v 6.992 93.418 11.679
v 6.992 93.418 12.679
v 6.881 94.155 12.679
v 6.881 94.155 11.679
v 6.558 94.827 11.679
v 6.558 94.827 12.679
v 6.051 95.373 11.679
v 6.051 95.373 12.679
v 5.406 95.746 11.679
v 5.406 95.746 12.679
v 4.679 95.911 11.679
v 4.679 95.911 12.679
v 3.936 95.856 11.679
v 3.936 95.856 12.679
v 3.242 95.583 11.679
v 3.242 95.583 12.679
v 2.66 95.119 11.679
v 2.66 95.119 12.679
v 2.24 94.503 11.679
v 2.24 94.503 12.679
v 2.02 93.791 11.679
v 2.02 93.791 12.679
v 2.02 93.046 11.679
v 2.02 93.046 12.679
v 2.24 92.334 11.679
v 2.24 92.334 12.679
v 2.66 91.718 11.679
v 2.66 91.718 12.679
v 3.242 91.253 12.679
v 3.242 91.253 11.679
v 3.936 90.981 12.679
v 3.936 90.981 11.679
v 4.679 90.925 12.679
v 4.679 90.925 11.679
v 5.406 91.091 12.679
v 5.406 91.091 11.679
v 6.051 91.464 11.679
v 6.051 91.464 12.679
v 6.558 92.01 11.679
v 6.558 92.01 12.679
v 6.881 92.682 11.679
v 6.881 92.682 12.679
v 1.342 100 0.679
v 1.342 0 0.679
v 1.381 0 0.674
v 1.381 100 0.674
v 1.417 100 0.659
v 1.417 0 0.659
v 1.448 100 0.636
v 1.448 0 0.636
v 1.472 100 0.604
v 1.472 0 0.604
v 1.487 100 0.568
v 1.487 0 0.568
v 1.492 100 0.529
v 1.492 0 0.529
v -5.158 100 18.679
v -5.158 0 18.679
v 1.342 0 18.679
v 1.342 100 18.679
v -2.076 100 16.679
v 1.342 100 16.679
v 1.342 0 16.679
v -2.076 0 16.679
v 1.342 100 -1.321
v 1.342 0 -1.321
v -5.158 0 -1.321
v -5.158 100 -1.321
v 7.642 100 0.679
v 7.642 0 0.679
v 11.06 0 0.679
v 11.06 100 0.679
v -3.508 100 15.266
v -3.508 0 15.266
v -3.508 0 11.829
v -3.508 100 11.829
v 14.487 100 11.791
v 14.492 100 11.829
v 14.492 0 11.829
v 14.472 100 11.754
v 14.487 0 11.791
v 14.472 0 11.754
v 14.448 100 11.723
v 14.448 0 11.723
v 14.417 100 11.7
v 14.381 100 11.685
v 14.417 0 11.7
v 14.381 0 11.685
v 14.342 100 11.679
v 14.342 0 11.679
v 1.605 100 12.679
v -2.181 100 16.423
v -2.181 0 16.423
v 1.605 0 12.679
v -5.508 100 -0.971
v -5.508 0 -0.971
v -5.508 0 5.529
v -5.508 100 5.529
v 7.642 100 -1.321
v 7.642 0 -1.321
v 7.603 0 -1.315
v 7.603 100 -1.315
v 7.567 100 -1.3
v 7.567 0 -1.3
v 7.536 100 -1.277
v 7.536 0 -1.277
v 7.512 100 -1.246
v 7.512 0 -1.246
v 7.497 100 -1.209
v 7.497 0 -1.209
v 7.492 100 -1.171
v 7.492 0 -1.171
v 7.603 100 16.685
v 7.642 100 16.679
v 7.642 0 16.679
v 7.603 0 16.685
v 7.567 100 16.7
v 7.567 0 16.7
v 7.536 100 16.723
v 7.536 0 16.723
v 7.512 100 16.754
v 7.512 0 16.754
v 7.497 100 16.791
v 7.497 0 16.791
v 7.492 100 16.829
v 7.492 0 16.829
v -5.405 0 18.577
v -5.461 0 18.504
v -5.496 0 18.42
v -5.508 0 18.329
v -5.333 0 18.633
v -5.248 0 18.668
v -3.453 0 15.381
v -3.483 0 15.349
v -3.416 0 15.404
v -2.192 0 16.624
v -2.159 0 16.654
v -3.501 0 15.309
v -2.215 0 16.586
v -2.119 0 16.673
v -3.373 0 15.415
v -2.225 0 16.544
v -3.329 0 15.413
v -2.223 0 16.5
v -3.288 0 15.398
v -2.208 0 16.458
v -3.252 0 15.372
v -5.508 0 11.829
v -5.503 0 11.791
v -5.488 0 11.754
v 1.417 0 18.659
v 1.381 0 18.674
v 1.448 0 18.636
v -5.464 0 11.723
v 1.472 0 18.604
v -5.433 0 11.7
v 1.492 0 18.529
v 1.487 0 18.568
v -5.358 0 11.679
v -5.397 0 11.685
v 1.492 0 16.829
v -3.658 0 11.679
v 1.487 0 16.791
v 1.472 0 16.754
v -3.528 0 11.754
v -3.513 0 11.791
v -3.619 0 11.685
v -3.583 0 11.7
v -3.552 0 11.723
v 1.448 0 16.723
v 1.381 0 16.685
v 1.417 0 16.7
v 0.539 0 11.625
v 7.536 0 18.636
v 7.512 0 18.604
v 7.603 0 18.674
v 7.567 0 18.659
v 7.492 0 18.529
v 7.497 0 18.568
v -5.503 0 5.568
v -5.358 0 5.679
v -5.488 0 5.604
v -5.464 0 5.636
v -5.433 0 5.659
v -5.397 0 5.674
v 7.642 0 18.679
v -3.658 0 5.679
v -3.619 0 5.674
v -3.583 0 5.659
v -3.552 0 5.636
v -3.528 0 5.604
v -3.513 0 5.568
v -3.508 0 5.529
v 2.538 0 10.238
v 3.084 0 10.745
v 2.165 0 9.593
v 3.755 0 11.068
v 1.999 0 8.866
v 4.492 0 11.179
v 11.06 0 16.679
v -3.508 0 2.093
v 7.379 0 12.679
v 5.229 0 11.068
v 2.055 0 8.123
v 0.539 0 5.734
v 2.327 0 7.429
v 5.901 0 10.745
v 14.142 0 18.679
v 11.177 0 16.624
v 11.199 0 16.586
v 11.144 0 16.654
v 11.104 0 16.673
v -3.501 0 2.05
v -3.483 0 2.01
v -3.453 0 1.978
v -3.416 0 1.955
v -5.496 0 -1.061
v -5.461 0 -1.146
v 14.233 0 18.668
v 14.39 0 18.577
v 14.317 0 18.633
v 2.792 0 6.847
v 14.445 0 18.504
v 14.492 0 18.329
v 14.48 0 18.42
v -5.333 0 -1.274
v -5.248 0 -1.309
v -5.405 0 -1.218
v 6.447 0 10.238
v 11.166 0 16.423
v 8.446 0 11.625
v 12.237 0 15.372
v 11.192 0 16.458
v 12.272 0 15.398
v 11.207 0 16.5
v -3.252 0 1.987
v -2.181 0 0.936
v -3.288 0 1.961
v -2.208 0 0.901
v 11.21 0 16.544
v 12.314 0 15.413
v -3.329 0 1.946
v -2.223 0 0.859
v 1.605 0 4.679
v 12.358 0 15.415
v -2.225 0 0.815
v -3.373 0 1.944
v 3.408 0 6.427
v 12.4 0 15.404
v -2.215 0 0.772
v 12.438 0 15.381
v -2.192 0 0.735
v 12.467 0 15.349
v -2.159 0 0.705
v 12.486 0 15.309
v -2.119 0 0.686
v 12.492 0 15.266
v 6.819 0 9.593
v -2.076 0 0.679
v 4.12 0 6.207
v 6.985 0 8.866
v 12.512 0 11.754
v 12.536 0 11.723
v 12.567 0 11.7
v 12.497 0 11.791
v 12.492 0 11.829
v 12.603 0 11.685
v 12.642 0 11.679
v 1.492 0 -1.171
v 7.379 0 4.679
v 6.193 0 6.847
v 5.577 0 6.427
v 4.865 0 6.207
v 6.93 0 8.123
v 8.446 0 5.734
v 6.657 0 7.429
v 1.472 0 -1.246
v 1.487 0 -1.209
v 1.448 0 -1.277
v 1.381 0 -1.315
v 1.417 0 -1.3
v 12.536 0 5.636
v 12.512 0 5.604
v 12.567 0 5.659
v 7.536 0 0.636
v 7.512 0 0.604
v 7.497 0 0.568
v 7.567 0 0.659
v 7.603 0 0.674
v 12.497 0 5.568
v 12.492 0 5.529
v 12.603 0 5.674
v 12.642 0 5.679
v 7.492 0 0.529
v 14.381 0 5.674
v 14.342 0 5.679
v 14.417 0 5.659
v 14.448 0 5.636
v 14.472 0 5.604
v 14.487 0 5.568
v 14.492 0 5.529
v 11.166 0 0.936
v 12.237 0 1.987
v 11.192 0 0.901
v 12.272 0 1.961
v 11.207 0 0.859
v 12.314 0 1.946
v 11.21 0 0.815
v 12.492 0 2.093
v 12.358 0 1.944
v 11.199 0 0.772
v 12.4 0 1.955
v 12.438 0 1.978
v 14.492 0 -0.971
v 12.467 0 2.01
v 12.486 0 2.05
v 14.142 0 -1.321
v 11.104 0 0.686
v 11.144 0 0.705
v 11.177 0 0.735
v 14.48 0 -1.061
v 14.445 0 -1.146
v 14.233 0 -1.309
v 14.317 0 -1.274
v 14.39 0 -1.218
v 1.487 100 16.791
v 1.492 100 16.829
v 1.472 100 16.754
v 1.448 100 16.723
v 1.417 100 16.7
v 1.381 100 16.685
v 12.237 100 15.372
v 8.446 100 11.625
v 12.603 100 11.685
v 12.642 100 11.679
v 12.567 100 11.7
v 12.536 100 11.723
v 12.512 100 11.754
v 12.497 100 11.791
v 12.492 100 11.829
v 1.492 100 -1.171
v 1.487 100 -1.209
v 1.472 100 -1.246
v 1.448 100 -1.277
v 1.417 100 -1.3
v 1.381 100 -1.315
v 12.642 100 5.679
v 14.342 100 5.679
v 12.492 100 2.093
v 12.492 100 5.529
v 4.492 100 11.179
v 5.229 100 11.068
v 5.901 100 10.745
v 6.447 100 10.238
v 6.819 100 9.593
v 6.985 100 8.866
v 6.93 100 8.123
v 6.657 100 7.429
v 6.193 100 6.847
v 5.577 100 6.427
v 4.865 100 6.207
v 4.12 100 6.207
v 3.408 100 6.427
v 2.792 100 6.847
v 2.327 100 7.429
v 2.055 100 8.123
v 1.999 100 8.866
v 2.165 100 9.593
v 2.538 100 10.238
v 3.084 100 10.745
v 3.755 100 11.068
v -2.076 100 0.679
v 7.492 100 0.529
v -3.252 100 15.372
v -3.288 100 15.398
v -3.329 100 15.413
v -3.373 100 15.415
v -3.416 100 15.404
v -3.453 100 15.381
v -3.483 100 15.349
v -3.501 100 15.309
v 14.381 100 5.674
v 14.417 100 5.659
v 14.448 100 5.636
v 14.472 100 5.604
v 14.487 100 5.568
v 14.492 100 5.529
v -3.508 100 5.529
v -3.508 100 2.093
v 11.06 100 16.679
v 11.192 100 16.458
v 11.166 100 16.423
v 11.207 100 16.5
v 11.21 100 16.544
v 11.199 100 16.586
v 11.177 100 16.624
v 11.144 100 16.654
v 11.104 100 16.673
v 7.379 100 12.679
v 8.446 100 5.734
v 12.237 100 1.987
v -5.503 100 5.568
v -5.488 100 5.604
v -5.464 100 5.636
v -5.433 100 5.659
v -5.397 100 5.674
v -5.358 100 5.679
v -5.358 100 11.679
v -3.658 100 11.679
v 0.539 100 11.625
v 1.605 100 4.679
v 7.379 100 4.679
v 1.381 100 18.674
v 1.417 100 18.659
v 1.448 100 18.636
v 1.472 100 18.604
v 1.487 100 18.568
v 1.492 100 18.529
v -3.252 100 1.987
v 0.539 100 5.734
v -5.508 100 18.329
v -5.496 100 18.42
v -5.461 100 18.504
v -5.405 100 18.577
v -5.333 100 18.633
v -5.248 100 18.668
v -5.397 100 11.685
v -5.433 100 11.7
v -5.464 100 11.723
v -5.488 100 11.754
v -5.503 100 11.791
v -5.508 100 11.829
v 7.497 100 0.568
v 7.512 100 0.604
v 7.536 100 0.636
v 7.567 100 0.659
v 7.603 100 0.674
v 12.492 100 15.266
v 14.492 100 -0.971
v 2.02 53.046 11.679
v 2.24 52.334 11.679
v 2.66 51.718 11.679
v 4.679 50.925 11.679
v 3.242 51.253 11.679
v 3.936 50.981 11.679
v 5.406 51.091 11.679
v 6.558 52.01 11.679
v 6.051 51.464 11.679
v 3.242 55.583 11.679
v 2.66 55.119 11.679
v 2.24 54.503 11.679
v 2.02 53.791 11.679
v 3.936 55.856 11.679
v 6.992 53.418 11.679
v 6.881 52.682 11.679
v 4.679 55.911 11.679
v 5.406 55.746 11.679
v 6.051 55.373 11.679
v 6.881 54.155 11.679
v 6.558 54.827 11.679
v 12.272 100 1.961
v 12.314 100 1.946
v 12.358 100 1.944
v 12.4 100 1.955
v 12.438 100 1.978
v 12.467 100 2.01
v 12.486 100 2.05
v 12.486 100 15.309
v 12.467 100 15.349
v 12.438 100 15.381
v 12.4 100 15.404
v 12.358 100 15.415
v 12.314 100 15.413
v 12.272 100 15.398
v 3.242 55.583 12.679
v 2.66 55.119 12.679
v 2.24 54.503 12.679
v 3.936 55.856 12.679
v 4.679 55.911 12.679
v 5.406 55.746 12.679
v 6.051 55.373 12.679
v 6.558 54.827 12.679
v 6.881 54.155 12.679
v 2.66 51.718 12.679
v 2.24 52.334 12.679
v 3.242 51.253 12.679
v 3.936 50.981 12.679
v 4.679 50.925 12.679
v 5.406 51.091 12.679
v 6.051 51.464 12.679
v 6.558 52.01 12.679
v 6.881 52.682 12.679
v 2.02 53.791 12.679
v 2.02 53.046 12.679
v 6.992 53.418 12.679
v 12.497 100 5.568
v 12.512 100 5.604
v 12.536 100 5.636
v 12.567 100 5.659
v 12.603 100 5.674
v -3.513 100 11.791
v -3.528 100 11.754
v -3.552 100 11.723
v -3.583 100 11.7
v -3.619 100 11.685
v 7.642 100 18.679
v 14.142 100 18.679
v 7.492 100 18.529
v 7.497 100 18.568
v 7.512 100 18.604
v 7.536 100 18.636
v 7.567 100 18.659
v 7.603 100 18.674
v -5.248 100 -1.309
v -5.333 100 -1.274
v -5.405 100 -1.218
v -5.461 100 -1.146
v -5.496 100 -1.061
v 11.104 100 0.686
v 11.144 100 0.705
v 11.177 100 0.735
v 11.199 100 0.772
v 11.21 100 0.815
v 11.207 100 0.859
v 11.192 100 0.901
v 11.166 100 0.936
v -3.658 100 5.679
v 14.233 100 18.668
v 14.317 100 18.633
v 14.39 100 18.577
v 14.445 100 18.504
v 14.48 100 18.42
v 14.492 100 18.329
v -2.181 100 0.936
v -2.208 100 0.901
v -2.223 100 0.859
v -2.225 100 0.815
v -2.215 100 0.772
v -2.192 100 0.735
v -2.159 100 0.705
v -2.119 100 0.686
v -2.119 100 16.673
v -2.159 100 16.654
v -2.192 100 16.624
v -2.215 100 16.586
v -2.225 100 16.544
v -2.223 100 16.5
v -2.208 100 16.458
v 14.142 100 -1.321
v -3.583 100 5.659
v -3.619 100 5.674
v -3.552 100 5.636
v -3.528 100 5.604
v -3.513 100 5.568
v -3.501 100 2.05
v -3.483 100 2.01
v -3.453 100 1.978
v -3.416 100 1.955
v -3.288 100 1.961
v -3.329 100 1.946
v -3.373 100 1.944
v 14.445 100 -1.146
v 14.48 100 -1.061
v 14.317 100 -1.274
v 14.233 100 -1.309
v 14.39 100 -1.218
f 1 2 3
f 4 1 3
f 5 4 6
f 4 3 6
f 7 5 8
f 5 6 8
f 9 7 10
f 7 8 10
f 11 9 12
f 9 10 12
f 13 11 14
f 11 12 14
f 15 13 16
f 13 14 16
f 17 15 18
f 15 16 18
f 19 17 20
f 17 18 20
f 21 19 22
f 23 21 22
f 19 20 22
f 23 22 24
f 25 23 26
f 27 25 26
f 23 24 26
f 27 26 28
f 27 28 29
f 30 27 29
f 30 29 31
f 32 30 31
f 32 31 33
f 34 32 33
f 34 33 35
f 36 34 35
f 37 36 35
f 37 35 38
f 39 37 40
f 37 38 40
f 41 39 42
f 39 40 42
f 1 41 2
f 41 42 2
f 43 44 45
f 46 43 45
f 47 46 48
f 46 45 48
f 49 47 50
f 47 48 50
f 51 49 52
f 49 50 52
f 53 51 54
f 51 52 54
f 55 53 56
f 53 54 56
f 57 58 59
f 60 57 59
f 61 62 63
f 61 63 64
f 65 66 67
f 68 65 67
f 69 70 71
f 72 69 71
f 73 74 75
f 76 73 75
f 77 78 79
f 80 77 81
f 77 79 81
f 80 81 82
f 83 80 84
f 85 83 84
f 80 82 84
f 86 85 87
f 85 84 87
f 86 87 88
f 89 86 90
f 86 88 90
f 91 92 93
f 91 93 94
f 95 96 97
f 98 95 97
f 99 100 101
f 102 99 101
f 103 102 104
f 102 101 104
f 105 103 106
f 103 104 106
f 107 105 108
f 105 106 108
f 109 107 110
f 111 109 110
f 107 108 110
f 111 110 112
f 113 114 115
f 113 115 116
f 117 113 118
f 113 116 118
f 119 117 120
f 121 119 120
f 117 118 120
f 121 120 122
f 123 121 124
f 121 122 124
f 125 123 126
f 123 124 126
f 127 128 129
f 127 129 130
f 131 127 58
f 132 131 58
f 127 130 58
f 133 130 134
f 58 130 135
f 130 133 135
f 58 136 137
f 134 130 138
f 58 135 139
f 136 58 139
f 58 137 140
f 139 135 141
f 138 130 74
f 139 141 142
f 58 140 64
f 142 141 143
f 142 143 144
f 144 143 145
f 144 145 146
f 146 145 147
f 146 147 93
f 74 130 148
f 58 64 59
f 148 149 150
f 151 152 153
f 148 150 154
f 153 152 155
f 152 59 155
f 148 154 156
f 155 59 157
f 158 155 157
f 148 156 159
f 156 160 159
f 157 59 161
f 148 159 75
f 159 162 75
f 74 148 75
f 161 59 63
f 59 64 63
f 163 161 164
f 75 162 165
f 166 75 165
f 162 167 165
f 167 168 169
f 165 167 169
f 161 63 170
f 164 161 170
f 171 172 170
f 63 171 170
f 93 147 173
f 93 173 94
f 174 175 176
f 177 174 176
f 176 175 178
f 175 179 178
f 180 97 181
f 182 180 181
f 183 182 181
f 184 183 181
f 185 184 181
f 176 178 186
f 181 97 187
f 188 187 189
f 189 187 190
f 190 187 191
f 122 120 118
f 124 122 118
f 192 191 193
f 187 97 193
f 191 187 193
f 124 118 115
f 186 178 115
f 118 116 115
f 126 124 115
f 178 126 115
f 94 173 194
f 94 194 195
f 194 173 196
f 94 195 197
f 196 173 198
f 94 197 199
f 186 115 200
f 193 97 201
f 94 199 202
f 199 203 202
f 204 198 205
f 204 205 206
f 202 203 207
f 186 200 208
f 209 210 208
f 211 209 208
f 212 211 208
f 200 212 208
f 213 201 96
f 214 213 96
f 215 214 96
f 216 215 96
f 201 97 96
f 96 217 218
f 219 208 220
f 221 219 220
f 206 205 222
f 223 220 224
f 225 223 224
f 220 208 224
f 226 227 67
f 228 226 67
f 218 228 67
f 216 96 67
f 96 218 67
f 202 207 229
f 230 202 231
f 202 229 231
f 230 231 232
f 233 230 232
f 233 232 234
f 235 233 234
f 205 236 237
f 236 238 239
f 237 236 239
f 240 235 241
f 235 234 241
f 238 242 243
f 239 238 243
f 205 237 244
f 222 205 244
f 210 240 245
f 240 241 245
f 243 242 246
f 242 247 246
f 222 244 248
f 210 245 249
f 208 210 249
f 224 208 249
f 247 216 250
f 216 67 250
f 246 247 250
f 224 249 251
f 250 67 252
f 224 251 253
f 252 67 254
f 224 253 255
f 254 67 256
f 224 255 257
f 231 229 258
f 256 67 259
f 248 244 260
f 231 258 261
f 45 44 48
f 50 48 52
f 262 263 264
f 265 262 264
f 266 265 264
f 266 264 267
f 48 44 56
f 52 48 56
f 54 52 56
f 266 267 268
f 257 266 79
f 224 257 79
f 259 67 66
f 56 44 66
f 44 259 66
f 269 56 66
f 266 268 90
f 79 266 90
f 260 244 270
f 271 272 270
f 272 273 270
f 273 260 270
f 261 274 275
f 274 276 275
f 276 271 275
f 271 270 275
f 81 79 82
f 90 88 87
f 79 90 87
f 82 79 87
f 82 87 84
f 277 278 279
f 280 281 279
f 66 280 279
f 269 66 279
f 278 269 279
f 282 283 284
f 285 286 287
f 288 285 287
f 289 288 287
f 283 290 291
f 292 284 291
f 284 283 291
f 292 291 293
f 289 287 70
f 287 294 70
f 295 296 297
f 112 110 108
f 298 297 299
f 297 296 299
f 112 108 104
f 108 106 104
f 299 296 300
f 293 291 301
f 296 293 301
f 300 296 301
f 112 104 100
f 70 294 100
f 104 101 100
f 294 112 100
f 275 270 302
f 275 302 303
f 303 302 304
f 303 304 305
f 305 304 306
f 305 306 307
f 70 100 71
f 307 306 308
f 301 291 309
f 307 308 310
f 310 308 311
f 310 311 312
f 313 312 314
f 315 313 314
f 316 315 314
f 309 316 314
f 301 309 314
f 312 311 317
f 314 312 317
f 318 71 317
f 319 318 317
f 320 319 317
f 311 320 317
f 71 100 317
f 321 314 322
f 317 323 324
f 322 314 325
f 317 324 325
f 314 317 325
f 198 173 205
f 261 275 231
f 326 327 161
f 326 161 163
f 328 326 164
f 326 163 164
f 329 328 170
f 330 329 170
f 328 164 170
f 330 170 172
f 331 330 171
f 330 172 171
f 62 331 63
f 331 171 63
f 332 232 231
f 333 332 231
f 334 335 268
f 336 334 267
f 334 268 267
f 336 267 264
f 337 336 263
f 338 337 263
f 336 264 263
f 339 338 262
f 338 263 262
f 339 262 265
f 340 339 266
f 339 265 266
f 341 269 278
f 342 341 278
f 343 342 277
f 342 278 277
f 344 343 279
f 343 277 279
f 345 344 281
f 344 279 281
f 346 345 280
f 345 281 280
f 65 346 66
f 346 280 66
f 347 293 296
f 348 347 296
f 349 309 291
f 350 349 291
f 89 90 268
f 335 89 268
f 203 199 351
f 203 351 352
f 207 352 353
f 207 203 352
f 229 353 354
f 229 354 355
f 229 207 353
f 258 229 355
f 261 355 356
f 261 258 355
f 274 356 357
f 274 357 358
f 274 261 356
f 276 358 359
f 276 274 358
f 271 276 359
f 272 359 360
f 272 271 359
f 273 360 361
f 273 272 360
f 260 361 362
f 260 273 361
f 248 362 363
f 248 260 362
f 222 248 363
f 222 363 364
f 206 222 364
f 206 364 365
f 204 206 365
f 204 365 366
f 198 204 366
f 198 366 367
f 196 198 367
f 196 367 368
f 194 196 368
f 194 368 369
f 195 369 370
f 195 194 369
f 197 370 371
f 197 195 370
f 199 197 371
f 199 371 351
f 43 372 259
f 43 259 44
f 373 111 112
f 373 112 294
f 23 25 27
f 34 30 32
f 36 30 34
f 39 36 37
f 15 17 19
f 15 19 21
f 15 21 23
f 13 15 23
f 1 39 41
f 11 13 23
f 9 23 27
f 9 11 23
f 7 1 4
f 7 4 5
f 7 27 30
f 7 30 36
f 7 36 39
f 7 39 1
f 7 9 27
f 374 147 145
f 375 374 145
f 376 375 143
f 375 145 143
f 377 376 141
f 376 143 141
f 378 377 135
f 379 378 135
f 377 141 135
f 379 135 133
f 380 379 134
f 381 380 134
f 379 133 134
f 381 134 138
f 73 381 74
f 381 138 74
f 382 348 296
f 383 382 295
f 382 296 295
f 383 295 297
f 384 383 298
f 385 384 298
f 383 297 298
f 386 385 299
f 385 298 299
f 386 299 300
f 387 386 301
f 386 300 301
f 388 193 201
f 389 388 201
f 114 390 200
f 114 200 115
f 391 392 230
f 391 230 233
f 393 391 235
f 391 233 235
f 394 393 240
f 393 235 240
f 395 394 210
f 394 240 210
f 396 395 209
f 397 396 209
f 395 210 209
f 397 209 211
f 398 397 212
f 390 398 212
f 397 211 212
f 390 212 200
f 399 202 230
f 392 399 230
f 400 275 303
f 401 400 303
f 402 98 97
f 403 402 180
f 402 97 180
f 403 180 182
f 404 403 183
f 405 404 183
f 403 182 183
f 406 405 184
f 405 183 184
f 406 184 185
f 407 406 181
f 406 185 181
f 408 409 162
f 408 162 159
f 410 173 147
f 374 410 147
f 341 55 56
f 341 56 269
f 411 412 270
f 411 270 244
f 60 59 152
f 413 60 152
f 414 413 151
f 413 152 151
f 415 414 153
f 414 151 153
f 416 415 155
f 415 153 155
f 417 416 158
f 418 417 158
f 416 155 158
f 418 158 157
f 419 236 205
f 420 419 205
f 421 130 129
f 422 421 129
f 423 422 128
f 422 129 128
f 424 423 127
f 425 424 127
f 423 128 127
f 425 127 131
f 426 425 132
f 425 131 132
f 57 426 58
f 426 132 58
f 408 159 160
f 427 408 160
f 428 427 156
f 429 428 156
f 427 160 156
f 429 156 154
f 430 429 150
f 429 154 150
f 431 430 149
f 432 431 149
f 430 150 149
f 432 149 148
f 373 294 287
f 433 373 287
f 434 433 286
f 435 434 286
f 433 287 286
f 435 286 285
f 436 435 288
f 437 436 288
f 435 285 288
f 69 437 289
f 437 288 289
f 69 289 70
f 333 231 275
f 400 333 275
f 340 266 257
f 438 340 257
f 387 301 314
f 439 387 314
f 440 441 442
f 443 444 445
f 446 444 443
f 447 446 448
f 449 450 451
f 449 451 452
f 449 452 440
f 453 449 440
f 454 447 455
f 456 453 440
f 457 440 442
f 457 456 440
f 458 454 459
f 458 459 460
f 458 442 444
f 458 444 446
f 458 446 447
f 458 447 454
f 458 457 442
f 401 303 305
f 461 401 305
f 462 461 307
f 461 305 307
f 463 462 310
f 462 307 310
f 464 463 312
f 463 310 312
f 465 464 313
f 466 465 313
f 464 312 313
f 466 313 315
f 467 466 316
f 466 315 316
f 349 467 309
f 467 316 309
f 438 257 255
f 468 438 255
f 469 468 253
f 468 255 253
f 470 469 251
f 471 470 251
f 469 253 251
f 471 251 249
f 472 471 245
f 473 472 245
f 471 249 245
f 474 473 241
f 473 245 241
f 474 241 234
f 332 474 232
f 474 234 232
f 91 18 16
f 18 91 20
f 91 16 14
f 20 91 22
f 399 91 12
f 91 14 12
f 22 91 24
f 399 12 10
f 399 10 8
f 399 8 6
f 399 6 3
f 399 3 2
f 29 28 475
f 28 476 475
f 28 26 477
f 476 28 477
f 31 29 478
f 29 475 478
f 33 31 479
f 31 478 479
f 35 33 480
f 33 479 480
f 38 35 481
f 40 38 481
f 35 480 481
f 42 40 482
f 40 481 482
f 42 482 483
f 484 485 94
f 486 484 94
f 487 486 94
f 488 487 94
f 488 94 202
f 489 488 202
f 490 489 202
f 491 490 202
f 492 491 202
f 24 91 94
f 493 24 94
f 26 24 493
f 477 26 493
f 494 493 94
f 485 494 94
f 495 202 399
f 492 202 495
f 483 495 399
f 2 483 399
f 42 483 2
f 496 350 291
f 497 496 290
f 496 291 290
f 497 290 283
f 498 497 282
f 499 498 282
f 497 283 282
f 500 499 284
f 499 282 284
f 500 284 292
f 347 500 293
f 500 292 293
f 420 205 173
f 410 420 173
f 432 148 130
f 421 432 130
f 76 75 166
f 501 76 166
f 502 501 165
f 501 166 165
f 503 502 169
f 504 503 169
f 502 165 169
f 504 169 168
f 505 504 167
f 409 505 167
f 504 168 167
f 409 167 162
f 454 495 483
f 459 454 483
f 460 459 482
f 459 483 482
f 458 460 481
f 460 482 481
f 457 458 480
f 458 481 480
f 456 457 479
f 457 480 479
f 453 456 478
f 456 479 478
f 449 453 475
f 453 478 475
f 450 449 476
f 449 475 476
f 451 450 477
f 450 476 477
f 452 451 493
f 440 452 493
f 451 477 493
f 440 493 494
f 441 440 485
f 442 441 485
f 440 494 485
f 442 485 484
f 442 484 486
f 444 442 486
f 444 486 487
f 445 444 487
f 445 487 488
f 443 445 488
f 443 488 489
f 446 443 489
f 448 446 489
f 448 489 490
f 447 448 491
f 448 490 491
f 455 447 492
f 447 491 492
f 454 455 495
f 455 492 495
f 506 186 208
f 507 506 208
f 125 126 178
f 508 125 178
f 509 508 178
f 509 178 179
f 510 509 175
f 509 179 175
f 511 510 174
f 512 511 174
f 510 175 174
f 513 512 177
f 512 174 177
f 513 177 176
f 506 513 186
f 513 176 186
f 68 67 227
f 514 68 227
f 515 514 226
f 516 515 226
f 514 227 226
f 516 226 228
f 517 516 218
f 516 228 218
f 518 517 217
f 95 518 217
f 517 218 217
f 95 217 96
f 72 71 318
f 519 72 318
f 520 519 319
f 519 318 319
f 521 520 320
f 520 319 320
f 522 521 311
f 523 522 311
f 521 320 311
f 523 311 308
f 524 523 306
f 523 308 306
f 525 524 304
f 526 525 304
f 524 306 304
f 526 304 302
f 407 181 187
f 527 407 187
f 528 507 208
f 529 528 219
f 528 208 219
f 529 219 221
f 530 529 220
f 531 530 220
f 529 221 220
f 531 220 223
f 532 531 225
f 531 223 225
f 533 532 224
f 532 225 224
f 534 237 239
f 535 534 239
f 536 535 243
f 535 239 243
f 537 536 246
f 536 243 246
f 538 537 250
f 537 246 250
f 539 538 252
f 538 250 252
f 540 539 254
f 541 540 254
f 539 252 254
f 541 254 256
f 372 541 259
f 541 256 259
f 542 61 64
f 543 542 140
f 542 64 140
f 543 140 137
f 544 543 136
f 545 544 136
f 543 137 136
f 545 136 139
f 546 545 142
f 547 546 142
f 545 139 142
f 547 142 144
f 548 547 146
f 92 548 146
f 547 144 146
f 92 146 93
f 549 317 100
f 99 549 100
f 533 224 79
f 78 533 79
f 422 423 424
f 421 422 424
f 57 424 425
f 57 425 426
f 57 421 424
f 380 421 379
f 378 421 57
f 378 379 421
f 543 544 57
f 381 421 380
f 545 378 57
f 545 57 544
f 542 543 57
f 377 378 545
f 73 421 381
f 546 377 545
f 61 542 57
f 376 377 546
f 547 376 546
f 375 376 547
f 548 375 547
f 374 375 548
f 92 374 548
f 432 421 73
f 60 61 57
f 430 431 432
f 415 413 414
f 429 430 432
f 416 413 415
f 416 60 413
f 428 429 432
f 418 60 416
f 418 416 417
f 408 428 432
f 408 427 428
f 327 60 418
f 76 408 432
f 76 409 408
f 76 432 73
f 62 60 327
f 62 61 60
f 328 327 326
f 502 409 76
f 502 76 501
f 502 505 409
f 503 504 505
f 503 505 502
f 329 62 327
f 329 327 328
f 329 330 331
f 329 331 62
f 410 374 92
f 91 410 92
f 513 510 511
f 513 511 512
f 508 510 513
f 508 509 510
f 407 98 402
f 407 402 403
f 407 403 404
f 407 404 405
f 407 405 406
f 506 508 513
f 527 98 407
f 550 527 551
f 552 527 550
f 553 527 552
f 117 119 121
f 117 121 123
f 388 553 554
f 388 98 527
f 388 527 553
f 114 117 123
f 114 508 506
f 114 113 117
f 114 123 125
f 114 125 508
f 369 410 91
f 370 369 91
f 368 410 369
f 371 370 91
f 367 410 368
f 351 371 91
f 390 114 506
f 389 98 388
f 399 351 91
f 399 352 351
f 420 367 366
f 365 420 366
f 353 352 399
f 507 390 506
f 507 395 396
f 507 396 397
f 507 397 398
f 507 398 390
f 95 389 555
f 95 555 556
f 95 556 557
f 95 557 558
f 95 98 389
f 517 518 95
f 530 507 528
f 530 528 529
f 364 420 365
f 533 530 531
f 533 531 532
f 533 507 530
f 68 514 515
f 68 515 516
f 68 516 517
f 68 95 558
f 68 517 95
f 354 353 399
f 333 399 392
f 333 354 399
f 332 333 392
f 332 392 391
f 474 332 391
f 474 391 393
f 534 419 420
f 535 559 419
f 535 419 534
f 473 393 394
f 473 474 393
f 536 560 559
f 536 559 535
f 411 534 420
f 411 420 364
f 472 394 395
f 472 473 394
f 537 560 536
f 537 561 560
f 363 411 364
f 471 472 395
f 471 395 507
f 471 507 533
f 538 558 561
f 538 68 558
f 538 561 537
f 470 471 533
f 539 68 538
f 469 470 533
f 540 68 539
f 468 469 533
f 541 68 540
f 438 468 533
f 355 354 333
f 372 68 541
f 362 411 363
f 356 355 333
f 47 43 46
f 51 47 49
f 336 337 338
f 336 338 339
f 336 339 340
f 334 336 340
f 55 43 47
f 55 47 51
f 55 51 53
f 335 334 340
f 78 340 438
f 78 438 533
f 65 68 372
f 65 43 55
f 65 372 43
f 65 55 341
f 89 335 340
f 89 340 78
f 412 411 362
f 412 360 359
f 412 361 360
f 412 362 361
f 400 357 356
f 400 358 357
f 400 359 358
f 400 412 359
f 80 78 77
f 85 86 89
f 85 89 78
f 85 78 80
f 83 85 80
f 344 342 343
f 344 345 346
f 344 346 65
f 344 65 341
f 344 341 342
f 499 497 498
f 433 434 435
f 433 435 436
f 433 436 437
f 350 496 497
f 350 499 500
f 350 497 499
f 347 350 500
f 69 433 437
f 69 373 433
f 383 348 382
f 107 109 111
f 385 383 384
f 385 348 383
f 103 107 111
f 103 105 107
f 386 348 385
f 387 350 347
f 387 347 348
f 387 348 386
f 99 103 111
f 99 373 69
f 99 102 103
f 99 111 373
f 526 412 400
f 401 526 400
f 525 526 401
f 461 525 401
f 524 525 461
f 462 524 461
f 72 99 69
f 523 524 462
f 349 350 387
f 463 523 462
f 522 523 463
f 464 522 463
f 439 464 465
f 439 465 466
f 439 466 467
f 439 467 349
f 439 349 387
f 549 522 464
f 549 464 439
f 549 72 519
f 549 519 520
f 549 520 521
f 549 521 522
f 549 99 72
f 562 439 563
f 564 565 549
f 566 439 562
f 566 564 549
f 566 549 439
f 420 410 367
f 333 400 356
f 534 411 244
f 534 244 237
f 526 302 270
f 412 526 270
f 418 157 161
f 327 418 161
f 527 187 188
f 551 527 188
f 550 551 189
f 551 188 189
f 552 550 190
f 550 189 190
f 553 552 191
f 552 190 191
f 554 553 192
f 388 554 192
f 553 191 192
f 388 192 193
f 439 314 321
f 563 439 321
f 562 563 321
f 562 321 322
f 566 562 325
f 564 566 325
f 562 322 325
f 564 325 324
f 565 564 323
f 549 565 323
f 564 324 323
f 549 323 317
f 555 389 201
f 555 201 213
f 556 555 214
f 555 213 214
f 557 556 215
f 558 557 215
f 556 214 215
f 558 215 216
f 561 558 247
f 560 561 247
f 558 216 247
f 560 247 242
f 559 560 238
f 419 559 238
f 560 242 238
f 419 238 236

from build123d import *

# Parameters (mm, degrees)
SKETCH1_R           = 2.5
BOSS_EXTRUDE1_DEPTH = 100
SKETCH2_R           = 2.5
CUT_EXTRUDE1_DEPTH  = 1


with BuildPart() as part:
    # Sketch1 → Boss-Extrude1 (new body)
    with BuildSketch(Plane(origin=(0, 0, 0), x_dir=(1, 0, 0), z_dir=(0, 1, 0))):
        with BuildLine():
            Line((-5.357713917, -5.679481981), (-3.657713917, -5.679481981))
            ThreePointArc((-3.657713917, -5.679481981), (-3.5516479, -5.635547998), (-3.507713917, -5.529481981))
            Line((-3.507713917, -5.529481981), (-3.507713917, -2.093297468))
            ThreePointArc((-3.507713917, -2.093297468), (-3.415514871, -1.954881249), (-3.252259921, -1.98662294))
            Line((-3.252259921, -1.98662294), (0.53858238, -5.734091759))
            Line((0.53858238, -5.734091759), (0.53858238, -11.624872203))
            Line((0.53858238, -11.624872203), (-3.252259921, -15.372341022))
            ThreePointArc((-3.252259921, -15.372341022), (-3.415514871, -15.404082713), (-3.507713917, -15.265666494))
            Line((-3.507713917, -15.265666494), (-3.507713917, -11.829481981))
            ThreePointArc((-3.507713917, -11.829481981), (-3.5516479, -11.723415964), (-3.657713917, -11.679481981))
            Line((-3.657713917, -11.679481981), (-5.357713917, -11.679481981))
            ThreePointArc((-5.357713917, -11.679481981), (-5.463779934, -11.723415964), (-5.507713917, -11.829481981))
            Line((-5.507713917, -11.829481981), (-5.507713917, -18.329481981))
            ThreePointArc((-5.507713917, -18.329481981), (-5.40520129, -18.576969354), (-5.157713917, -18.679481981))
            Line((-5.157713917, -18.679481981), (1.342286083, -18.679481981))
            ThreePointArc((1.342286083, -18.679481981), (1.4483521, -18.635547998), (1.492286083, -18.529481981))
            Line((1.492286083, -18.529481981), (1.492286083, -16.829481981))
            ThreePointArc((1.492286083, -16.829481981), (1.4483521, -16.723415964), (1.342286083, -16.679481981))
            Line((1.342286083, -16.679481981), (-2.075798714, -16.679481981))
            ThreePointArc((-2.075798714, -16.679481981), (-2.214545208, -16.586485581), (-2.181252709, -16.422807453))
            Line((-2.181252709, -16.422807453), (1.605398289, -12.679481981))
            Line((1.605398289, -12.679481981), (7.379173877, -12.679481981))
            Line((7.379173877, -12.679481981), (11.165824876, -16.422807453))
            ThreePointArc((11.165824876, -16.422807453), (11.199117374, -16.586485581), (11.06037088, -16.679481981))
            Line((11.06037088, -16.679481981), (7.642286083, -16.679481981))
            ThreePointArc((7.642286083, -16.679481981), (7.536220066, -16.723415964), (7.492286083, -16.829481981))
            Line((7.492286083, -16.829481981), (7.492286083, -18.529481981))
            ThreePointArc((7.492286083, -18.529481981), (7.536220066, -18.635547998), (7.642286083, -18.679481981))
            Line((7.642286083, -18.679481981), (14.142286083, -18.679481981))
            ThreePointArc((14.142286083, -18.679481981), (14.389773457, -18.576969354), (14.492286083, -18.329481981))
            Line((14.492286083, -18.329481981), (14.492286083, -11.829481981))
            ThreePointArc((14.492286083, -11.829481981), (14.4483521, -11.723415964), (14.342286083, -11.679481981))
            Line((14.342286083, -11.679481981), (12.642286083, -11.679481981))
            ThreePointArc((12.642286083, -11.679481981), (12.536220066, -11.723415964), (12.492286083, -11.829481981))
            Line((12.492286083, -11.829481981), (12.492286083, -15.265666494))
            ThreePointArc((12.492286083, -15.265666494), (12.400087038, -15.404082713), (12.236832088, -15.372341022))
            Line((12.236832088, -15.372341022), (8.445989787, -11.624872203))
            Line((8.445989787, -11.624872203), (8.445989787, -5.734091759))
            Line((8.445989787, -5.734091759), (12.236832088, -1.98662294))
            ThreePointArc((12.236832088, -1.98662294), (12.400087038, -1.954881249), (12.492286083, -2.093297468))
            Line((12.492286083, -2.093297468), (12.492286083, -5.529481981))
            ThreePointArc((12.492286083, -5.529481981), (12.536220066, -5.635547998), (12.642286083, -5.679481981))
            Line((12.642286083, -5.679481981), (14.342286083, -5.679481981))
            ThreePointArc((14.342286083, -5.679481981), (14.4483521, -5.635547998), (14.492286083, -5.529481981))
            Line((14.492286083, -5.529481981), (14.492286083, 0.970518019))
            ThreePointArc((14.492286083, 0.970518019), (14.389773457, 1.218005392), (14.142286083, 1.320518019))
            Line((14.142286083, 1.320518019), (7.642286083, 1.320518019))
            ThreePointArc((7.642286083, 1.320518019), (7.536220066, 1.276584036), (7.492286083, 1.170518019))
            Line((7.492286083, 1.170518019), (7.492286083, -0.529481981))
            ThreePointArc((7.492286083, -0.529481981), (7.536220066, -0.635547998), (7.642286083, -0.679481981))
            Line((7.642286083, -0.679481981), (11.06037088, -0.679481981))
            ThreePointArc((11.06037088, -0.679481981), (11.199117374, -0.772478381), (11.165824876, -0.936156509))
            Line((11.165824876, -0.936156509), (7.379173877, -4.679481981))
            Line((7.379173877, -4.679481981), (1.605398289, -4.679481981))
            Line((1.605398289, -4.679481981), (-2.181252709, -0.936156509))
            ThreePointArc((-2.181252709, -0.936156509), (-2.214545208, -0.772478381), (-2.075798714, -0.679481981))
            Line((-2.075798714, -0.679481981), (1.342286083, -0.679481981))
            ThreePointArc((1.342286083, -0.679481981), (1.4483521, -0.635547998), (1.492286083, -0.529481981))
            Line((1.492286083, -0.529481981), (1.492286083, 1.170518019))
            ThreePointArc((1.492286083, 1.170518019), (1.4483521, 1.276584036), (1.342286083, 1.320518019))
            Line((1.342286083, 1.320518019), (-5.157713917, 1.320518019))
            ThreePointArc((-5.157713917, 1.320518019), (-5.40520129, 1.218005392), (-5.507713917, 0.970518019))
            Line((-5.507713917, 0.970518019), (-5.507713917, -5.529481981))
            ThreePointArc((-5.507713917, -5.529481981), (-5.463779934, -5.635547998), (-5.357713917, -5.679481981))
        make_face()
        with Locations(Location((4.492286083, -8.679481981, 0), (0, 0, 270))):
            Circle(SKETCH1_R, mode=Mode.SUBTRACT)
    extrude(amount=BOSS_EXTRUDE1_DEPTH)

    # Sketch2 → Cut-Extrude1 (cut)
    with BuildSketch(Plane.XY.offset(12.679481981)):
        with Locations((4.492286083, 53.418394615)):
            Circle(SKETCH2_R)
        with Locations((4.492286083, 93.418394615)):
            Circle(SKETCH2_R)
    extrude(amount=-CUT_EXTRUDE1_DEPTH, mode=Mode.SUBTRACT)


solid = part.part
